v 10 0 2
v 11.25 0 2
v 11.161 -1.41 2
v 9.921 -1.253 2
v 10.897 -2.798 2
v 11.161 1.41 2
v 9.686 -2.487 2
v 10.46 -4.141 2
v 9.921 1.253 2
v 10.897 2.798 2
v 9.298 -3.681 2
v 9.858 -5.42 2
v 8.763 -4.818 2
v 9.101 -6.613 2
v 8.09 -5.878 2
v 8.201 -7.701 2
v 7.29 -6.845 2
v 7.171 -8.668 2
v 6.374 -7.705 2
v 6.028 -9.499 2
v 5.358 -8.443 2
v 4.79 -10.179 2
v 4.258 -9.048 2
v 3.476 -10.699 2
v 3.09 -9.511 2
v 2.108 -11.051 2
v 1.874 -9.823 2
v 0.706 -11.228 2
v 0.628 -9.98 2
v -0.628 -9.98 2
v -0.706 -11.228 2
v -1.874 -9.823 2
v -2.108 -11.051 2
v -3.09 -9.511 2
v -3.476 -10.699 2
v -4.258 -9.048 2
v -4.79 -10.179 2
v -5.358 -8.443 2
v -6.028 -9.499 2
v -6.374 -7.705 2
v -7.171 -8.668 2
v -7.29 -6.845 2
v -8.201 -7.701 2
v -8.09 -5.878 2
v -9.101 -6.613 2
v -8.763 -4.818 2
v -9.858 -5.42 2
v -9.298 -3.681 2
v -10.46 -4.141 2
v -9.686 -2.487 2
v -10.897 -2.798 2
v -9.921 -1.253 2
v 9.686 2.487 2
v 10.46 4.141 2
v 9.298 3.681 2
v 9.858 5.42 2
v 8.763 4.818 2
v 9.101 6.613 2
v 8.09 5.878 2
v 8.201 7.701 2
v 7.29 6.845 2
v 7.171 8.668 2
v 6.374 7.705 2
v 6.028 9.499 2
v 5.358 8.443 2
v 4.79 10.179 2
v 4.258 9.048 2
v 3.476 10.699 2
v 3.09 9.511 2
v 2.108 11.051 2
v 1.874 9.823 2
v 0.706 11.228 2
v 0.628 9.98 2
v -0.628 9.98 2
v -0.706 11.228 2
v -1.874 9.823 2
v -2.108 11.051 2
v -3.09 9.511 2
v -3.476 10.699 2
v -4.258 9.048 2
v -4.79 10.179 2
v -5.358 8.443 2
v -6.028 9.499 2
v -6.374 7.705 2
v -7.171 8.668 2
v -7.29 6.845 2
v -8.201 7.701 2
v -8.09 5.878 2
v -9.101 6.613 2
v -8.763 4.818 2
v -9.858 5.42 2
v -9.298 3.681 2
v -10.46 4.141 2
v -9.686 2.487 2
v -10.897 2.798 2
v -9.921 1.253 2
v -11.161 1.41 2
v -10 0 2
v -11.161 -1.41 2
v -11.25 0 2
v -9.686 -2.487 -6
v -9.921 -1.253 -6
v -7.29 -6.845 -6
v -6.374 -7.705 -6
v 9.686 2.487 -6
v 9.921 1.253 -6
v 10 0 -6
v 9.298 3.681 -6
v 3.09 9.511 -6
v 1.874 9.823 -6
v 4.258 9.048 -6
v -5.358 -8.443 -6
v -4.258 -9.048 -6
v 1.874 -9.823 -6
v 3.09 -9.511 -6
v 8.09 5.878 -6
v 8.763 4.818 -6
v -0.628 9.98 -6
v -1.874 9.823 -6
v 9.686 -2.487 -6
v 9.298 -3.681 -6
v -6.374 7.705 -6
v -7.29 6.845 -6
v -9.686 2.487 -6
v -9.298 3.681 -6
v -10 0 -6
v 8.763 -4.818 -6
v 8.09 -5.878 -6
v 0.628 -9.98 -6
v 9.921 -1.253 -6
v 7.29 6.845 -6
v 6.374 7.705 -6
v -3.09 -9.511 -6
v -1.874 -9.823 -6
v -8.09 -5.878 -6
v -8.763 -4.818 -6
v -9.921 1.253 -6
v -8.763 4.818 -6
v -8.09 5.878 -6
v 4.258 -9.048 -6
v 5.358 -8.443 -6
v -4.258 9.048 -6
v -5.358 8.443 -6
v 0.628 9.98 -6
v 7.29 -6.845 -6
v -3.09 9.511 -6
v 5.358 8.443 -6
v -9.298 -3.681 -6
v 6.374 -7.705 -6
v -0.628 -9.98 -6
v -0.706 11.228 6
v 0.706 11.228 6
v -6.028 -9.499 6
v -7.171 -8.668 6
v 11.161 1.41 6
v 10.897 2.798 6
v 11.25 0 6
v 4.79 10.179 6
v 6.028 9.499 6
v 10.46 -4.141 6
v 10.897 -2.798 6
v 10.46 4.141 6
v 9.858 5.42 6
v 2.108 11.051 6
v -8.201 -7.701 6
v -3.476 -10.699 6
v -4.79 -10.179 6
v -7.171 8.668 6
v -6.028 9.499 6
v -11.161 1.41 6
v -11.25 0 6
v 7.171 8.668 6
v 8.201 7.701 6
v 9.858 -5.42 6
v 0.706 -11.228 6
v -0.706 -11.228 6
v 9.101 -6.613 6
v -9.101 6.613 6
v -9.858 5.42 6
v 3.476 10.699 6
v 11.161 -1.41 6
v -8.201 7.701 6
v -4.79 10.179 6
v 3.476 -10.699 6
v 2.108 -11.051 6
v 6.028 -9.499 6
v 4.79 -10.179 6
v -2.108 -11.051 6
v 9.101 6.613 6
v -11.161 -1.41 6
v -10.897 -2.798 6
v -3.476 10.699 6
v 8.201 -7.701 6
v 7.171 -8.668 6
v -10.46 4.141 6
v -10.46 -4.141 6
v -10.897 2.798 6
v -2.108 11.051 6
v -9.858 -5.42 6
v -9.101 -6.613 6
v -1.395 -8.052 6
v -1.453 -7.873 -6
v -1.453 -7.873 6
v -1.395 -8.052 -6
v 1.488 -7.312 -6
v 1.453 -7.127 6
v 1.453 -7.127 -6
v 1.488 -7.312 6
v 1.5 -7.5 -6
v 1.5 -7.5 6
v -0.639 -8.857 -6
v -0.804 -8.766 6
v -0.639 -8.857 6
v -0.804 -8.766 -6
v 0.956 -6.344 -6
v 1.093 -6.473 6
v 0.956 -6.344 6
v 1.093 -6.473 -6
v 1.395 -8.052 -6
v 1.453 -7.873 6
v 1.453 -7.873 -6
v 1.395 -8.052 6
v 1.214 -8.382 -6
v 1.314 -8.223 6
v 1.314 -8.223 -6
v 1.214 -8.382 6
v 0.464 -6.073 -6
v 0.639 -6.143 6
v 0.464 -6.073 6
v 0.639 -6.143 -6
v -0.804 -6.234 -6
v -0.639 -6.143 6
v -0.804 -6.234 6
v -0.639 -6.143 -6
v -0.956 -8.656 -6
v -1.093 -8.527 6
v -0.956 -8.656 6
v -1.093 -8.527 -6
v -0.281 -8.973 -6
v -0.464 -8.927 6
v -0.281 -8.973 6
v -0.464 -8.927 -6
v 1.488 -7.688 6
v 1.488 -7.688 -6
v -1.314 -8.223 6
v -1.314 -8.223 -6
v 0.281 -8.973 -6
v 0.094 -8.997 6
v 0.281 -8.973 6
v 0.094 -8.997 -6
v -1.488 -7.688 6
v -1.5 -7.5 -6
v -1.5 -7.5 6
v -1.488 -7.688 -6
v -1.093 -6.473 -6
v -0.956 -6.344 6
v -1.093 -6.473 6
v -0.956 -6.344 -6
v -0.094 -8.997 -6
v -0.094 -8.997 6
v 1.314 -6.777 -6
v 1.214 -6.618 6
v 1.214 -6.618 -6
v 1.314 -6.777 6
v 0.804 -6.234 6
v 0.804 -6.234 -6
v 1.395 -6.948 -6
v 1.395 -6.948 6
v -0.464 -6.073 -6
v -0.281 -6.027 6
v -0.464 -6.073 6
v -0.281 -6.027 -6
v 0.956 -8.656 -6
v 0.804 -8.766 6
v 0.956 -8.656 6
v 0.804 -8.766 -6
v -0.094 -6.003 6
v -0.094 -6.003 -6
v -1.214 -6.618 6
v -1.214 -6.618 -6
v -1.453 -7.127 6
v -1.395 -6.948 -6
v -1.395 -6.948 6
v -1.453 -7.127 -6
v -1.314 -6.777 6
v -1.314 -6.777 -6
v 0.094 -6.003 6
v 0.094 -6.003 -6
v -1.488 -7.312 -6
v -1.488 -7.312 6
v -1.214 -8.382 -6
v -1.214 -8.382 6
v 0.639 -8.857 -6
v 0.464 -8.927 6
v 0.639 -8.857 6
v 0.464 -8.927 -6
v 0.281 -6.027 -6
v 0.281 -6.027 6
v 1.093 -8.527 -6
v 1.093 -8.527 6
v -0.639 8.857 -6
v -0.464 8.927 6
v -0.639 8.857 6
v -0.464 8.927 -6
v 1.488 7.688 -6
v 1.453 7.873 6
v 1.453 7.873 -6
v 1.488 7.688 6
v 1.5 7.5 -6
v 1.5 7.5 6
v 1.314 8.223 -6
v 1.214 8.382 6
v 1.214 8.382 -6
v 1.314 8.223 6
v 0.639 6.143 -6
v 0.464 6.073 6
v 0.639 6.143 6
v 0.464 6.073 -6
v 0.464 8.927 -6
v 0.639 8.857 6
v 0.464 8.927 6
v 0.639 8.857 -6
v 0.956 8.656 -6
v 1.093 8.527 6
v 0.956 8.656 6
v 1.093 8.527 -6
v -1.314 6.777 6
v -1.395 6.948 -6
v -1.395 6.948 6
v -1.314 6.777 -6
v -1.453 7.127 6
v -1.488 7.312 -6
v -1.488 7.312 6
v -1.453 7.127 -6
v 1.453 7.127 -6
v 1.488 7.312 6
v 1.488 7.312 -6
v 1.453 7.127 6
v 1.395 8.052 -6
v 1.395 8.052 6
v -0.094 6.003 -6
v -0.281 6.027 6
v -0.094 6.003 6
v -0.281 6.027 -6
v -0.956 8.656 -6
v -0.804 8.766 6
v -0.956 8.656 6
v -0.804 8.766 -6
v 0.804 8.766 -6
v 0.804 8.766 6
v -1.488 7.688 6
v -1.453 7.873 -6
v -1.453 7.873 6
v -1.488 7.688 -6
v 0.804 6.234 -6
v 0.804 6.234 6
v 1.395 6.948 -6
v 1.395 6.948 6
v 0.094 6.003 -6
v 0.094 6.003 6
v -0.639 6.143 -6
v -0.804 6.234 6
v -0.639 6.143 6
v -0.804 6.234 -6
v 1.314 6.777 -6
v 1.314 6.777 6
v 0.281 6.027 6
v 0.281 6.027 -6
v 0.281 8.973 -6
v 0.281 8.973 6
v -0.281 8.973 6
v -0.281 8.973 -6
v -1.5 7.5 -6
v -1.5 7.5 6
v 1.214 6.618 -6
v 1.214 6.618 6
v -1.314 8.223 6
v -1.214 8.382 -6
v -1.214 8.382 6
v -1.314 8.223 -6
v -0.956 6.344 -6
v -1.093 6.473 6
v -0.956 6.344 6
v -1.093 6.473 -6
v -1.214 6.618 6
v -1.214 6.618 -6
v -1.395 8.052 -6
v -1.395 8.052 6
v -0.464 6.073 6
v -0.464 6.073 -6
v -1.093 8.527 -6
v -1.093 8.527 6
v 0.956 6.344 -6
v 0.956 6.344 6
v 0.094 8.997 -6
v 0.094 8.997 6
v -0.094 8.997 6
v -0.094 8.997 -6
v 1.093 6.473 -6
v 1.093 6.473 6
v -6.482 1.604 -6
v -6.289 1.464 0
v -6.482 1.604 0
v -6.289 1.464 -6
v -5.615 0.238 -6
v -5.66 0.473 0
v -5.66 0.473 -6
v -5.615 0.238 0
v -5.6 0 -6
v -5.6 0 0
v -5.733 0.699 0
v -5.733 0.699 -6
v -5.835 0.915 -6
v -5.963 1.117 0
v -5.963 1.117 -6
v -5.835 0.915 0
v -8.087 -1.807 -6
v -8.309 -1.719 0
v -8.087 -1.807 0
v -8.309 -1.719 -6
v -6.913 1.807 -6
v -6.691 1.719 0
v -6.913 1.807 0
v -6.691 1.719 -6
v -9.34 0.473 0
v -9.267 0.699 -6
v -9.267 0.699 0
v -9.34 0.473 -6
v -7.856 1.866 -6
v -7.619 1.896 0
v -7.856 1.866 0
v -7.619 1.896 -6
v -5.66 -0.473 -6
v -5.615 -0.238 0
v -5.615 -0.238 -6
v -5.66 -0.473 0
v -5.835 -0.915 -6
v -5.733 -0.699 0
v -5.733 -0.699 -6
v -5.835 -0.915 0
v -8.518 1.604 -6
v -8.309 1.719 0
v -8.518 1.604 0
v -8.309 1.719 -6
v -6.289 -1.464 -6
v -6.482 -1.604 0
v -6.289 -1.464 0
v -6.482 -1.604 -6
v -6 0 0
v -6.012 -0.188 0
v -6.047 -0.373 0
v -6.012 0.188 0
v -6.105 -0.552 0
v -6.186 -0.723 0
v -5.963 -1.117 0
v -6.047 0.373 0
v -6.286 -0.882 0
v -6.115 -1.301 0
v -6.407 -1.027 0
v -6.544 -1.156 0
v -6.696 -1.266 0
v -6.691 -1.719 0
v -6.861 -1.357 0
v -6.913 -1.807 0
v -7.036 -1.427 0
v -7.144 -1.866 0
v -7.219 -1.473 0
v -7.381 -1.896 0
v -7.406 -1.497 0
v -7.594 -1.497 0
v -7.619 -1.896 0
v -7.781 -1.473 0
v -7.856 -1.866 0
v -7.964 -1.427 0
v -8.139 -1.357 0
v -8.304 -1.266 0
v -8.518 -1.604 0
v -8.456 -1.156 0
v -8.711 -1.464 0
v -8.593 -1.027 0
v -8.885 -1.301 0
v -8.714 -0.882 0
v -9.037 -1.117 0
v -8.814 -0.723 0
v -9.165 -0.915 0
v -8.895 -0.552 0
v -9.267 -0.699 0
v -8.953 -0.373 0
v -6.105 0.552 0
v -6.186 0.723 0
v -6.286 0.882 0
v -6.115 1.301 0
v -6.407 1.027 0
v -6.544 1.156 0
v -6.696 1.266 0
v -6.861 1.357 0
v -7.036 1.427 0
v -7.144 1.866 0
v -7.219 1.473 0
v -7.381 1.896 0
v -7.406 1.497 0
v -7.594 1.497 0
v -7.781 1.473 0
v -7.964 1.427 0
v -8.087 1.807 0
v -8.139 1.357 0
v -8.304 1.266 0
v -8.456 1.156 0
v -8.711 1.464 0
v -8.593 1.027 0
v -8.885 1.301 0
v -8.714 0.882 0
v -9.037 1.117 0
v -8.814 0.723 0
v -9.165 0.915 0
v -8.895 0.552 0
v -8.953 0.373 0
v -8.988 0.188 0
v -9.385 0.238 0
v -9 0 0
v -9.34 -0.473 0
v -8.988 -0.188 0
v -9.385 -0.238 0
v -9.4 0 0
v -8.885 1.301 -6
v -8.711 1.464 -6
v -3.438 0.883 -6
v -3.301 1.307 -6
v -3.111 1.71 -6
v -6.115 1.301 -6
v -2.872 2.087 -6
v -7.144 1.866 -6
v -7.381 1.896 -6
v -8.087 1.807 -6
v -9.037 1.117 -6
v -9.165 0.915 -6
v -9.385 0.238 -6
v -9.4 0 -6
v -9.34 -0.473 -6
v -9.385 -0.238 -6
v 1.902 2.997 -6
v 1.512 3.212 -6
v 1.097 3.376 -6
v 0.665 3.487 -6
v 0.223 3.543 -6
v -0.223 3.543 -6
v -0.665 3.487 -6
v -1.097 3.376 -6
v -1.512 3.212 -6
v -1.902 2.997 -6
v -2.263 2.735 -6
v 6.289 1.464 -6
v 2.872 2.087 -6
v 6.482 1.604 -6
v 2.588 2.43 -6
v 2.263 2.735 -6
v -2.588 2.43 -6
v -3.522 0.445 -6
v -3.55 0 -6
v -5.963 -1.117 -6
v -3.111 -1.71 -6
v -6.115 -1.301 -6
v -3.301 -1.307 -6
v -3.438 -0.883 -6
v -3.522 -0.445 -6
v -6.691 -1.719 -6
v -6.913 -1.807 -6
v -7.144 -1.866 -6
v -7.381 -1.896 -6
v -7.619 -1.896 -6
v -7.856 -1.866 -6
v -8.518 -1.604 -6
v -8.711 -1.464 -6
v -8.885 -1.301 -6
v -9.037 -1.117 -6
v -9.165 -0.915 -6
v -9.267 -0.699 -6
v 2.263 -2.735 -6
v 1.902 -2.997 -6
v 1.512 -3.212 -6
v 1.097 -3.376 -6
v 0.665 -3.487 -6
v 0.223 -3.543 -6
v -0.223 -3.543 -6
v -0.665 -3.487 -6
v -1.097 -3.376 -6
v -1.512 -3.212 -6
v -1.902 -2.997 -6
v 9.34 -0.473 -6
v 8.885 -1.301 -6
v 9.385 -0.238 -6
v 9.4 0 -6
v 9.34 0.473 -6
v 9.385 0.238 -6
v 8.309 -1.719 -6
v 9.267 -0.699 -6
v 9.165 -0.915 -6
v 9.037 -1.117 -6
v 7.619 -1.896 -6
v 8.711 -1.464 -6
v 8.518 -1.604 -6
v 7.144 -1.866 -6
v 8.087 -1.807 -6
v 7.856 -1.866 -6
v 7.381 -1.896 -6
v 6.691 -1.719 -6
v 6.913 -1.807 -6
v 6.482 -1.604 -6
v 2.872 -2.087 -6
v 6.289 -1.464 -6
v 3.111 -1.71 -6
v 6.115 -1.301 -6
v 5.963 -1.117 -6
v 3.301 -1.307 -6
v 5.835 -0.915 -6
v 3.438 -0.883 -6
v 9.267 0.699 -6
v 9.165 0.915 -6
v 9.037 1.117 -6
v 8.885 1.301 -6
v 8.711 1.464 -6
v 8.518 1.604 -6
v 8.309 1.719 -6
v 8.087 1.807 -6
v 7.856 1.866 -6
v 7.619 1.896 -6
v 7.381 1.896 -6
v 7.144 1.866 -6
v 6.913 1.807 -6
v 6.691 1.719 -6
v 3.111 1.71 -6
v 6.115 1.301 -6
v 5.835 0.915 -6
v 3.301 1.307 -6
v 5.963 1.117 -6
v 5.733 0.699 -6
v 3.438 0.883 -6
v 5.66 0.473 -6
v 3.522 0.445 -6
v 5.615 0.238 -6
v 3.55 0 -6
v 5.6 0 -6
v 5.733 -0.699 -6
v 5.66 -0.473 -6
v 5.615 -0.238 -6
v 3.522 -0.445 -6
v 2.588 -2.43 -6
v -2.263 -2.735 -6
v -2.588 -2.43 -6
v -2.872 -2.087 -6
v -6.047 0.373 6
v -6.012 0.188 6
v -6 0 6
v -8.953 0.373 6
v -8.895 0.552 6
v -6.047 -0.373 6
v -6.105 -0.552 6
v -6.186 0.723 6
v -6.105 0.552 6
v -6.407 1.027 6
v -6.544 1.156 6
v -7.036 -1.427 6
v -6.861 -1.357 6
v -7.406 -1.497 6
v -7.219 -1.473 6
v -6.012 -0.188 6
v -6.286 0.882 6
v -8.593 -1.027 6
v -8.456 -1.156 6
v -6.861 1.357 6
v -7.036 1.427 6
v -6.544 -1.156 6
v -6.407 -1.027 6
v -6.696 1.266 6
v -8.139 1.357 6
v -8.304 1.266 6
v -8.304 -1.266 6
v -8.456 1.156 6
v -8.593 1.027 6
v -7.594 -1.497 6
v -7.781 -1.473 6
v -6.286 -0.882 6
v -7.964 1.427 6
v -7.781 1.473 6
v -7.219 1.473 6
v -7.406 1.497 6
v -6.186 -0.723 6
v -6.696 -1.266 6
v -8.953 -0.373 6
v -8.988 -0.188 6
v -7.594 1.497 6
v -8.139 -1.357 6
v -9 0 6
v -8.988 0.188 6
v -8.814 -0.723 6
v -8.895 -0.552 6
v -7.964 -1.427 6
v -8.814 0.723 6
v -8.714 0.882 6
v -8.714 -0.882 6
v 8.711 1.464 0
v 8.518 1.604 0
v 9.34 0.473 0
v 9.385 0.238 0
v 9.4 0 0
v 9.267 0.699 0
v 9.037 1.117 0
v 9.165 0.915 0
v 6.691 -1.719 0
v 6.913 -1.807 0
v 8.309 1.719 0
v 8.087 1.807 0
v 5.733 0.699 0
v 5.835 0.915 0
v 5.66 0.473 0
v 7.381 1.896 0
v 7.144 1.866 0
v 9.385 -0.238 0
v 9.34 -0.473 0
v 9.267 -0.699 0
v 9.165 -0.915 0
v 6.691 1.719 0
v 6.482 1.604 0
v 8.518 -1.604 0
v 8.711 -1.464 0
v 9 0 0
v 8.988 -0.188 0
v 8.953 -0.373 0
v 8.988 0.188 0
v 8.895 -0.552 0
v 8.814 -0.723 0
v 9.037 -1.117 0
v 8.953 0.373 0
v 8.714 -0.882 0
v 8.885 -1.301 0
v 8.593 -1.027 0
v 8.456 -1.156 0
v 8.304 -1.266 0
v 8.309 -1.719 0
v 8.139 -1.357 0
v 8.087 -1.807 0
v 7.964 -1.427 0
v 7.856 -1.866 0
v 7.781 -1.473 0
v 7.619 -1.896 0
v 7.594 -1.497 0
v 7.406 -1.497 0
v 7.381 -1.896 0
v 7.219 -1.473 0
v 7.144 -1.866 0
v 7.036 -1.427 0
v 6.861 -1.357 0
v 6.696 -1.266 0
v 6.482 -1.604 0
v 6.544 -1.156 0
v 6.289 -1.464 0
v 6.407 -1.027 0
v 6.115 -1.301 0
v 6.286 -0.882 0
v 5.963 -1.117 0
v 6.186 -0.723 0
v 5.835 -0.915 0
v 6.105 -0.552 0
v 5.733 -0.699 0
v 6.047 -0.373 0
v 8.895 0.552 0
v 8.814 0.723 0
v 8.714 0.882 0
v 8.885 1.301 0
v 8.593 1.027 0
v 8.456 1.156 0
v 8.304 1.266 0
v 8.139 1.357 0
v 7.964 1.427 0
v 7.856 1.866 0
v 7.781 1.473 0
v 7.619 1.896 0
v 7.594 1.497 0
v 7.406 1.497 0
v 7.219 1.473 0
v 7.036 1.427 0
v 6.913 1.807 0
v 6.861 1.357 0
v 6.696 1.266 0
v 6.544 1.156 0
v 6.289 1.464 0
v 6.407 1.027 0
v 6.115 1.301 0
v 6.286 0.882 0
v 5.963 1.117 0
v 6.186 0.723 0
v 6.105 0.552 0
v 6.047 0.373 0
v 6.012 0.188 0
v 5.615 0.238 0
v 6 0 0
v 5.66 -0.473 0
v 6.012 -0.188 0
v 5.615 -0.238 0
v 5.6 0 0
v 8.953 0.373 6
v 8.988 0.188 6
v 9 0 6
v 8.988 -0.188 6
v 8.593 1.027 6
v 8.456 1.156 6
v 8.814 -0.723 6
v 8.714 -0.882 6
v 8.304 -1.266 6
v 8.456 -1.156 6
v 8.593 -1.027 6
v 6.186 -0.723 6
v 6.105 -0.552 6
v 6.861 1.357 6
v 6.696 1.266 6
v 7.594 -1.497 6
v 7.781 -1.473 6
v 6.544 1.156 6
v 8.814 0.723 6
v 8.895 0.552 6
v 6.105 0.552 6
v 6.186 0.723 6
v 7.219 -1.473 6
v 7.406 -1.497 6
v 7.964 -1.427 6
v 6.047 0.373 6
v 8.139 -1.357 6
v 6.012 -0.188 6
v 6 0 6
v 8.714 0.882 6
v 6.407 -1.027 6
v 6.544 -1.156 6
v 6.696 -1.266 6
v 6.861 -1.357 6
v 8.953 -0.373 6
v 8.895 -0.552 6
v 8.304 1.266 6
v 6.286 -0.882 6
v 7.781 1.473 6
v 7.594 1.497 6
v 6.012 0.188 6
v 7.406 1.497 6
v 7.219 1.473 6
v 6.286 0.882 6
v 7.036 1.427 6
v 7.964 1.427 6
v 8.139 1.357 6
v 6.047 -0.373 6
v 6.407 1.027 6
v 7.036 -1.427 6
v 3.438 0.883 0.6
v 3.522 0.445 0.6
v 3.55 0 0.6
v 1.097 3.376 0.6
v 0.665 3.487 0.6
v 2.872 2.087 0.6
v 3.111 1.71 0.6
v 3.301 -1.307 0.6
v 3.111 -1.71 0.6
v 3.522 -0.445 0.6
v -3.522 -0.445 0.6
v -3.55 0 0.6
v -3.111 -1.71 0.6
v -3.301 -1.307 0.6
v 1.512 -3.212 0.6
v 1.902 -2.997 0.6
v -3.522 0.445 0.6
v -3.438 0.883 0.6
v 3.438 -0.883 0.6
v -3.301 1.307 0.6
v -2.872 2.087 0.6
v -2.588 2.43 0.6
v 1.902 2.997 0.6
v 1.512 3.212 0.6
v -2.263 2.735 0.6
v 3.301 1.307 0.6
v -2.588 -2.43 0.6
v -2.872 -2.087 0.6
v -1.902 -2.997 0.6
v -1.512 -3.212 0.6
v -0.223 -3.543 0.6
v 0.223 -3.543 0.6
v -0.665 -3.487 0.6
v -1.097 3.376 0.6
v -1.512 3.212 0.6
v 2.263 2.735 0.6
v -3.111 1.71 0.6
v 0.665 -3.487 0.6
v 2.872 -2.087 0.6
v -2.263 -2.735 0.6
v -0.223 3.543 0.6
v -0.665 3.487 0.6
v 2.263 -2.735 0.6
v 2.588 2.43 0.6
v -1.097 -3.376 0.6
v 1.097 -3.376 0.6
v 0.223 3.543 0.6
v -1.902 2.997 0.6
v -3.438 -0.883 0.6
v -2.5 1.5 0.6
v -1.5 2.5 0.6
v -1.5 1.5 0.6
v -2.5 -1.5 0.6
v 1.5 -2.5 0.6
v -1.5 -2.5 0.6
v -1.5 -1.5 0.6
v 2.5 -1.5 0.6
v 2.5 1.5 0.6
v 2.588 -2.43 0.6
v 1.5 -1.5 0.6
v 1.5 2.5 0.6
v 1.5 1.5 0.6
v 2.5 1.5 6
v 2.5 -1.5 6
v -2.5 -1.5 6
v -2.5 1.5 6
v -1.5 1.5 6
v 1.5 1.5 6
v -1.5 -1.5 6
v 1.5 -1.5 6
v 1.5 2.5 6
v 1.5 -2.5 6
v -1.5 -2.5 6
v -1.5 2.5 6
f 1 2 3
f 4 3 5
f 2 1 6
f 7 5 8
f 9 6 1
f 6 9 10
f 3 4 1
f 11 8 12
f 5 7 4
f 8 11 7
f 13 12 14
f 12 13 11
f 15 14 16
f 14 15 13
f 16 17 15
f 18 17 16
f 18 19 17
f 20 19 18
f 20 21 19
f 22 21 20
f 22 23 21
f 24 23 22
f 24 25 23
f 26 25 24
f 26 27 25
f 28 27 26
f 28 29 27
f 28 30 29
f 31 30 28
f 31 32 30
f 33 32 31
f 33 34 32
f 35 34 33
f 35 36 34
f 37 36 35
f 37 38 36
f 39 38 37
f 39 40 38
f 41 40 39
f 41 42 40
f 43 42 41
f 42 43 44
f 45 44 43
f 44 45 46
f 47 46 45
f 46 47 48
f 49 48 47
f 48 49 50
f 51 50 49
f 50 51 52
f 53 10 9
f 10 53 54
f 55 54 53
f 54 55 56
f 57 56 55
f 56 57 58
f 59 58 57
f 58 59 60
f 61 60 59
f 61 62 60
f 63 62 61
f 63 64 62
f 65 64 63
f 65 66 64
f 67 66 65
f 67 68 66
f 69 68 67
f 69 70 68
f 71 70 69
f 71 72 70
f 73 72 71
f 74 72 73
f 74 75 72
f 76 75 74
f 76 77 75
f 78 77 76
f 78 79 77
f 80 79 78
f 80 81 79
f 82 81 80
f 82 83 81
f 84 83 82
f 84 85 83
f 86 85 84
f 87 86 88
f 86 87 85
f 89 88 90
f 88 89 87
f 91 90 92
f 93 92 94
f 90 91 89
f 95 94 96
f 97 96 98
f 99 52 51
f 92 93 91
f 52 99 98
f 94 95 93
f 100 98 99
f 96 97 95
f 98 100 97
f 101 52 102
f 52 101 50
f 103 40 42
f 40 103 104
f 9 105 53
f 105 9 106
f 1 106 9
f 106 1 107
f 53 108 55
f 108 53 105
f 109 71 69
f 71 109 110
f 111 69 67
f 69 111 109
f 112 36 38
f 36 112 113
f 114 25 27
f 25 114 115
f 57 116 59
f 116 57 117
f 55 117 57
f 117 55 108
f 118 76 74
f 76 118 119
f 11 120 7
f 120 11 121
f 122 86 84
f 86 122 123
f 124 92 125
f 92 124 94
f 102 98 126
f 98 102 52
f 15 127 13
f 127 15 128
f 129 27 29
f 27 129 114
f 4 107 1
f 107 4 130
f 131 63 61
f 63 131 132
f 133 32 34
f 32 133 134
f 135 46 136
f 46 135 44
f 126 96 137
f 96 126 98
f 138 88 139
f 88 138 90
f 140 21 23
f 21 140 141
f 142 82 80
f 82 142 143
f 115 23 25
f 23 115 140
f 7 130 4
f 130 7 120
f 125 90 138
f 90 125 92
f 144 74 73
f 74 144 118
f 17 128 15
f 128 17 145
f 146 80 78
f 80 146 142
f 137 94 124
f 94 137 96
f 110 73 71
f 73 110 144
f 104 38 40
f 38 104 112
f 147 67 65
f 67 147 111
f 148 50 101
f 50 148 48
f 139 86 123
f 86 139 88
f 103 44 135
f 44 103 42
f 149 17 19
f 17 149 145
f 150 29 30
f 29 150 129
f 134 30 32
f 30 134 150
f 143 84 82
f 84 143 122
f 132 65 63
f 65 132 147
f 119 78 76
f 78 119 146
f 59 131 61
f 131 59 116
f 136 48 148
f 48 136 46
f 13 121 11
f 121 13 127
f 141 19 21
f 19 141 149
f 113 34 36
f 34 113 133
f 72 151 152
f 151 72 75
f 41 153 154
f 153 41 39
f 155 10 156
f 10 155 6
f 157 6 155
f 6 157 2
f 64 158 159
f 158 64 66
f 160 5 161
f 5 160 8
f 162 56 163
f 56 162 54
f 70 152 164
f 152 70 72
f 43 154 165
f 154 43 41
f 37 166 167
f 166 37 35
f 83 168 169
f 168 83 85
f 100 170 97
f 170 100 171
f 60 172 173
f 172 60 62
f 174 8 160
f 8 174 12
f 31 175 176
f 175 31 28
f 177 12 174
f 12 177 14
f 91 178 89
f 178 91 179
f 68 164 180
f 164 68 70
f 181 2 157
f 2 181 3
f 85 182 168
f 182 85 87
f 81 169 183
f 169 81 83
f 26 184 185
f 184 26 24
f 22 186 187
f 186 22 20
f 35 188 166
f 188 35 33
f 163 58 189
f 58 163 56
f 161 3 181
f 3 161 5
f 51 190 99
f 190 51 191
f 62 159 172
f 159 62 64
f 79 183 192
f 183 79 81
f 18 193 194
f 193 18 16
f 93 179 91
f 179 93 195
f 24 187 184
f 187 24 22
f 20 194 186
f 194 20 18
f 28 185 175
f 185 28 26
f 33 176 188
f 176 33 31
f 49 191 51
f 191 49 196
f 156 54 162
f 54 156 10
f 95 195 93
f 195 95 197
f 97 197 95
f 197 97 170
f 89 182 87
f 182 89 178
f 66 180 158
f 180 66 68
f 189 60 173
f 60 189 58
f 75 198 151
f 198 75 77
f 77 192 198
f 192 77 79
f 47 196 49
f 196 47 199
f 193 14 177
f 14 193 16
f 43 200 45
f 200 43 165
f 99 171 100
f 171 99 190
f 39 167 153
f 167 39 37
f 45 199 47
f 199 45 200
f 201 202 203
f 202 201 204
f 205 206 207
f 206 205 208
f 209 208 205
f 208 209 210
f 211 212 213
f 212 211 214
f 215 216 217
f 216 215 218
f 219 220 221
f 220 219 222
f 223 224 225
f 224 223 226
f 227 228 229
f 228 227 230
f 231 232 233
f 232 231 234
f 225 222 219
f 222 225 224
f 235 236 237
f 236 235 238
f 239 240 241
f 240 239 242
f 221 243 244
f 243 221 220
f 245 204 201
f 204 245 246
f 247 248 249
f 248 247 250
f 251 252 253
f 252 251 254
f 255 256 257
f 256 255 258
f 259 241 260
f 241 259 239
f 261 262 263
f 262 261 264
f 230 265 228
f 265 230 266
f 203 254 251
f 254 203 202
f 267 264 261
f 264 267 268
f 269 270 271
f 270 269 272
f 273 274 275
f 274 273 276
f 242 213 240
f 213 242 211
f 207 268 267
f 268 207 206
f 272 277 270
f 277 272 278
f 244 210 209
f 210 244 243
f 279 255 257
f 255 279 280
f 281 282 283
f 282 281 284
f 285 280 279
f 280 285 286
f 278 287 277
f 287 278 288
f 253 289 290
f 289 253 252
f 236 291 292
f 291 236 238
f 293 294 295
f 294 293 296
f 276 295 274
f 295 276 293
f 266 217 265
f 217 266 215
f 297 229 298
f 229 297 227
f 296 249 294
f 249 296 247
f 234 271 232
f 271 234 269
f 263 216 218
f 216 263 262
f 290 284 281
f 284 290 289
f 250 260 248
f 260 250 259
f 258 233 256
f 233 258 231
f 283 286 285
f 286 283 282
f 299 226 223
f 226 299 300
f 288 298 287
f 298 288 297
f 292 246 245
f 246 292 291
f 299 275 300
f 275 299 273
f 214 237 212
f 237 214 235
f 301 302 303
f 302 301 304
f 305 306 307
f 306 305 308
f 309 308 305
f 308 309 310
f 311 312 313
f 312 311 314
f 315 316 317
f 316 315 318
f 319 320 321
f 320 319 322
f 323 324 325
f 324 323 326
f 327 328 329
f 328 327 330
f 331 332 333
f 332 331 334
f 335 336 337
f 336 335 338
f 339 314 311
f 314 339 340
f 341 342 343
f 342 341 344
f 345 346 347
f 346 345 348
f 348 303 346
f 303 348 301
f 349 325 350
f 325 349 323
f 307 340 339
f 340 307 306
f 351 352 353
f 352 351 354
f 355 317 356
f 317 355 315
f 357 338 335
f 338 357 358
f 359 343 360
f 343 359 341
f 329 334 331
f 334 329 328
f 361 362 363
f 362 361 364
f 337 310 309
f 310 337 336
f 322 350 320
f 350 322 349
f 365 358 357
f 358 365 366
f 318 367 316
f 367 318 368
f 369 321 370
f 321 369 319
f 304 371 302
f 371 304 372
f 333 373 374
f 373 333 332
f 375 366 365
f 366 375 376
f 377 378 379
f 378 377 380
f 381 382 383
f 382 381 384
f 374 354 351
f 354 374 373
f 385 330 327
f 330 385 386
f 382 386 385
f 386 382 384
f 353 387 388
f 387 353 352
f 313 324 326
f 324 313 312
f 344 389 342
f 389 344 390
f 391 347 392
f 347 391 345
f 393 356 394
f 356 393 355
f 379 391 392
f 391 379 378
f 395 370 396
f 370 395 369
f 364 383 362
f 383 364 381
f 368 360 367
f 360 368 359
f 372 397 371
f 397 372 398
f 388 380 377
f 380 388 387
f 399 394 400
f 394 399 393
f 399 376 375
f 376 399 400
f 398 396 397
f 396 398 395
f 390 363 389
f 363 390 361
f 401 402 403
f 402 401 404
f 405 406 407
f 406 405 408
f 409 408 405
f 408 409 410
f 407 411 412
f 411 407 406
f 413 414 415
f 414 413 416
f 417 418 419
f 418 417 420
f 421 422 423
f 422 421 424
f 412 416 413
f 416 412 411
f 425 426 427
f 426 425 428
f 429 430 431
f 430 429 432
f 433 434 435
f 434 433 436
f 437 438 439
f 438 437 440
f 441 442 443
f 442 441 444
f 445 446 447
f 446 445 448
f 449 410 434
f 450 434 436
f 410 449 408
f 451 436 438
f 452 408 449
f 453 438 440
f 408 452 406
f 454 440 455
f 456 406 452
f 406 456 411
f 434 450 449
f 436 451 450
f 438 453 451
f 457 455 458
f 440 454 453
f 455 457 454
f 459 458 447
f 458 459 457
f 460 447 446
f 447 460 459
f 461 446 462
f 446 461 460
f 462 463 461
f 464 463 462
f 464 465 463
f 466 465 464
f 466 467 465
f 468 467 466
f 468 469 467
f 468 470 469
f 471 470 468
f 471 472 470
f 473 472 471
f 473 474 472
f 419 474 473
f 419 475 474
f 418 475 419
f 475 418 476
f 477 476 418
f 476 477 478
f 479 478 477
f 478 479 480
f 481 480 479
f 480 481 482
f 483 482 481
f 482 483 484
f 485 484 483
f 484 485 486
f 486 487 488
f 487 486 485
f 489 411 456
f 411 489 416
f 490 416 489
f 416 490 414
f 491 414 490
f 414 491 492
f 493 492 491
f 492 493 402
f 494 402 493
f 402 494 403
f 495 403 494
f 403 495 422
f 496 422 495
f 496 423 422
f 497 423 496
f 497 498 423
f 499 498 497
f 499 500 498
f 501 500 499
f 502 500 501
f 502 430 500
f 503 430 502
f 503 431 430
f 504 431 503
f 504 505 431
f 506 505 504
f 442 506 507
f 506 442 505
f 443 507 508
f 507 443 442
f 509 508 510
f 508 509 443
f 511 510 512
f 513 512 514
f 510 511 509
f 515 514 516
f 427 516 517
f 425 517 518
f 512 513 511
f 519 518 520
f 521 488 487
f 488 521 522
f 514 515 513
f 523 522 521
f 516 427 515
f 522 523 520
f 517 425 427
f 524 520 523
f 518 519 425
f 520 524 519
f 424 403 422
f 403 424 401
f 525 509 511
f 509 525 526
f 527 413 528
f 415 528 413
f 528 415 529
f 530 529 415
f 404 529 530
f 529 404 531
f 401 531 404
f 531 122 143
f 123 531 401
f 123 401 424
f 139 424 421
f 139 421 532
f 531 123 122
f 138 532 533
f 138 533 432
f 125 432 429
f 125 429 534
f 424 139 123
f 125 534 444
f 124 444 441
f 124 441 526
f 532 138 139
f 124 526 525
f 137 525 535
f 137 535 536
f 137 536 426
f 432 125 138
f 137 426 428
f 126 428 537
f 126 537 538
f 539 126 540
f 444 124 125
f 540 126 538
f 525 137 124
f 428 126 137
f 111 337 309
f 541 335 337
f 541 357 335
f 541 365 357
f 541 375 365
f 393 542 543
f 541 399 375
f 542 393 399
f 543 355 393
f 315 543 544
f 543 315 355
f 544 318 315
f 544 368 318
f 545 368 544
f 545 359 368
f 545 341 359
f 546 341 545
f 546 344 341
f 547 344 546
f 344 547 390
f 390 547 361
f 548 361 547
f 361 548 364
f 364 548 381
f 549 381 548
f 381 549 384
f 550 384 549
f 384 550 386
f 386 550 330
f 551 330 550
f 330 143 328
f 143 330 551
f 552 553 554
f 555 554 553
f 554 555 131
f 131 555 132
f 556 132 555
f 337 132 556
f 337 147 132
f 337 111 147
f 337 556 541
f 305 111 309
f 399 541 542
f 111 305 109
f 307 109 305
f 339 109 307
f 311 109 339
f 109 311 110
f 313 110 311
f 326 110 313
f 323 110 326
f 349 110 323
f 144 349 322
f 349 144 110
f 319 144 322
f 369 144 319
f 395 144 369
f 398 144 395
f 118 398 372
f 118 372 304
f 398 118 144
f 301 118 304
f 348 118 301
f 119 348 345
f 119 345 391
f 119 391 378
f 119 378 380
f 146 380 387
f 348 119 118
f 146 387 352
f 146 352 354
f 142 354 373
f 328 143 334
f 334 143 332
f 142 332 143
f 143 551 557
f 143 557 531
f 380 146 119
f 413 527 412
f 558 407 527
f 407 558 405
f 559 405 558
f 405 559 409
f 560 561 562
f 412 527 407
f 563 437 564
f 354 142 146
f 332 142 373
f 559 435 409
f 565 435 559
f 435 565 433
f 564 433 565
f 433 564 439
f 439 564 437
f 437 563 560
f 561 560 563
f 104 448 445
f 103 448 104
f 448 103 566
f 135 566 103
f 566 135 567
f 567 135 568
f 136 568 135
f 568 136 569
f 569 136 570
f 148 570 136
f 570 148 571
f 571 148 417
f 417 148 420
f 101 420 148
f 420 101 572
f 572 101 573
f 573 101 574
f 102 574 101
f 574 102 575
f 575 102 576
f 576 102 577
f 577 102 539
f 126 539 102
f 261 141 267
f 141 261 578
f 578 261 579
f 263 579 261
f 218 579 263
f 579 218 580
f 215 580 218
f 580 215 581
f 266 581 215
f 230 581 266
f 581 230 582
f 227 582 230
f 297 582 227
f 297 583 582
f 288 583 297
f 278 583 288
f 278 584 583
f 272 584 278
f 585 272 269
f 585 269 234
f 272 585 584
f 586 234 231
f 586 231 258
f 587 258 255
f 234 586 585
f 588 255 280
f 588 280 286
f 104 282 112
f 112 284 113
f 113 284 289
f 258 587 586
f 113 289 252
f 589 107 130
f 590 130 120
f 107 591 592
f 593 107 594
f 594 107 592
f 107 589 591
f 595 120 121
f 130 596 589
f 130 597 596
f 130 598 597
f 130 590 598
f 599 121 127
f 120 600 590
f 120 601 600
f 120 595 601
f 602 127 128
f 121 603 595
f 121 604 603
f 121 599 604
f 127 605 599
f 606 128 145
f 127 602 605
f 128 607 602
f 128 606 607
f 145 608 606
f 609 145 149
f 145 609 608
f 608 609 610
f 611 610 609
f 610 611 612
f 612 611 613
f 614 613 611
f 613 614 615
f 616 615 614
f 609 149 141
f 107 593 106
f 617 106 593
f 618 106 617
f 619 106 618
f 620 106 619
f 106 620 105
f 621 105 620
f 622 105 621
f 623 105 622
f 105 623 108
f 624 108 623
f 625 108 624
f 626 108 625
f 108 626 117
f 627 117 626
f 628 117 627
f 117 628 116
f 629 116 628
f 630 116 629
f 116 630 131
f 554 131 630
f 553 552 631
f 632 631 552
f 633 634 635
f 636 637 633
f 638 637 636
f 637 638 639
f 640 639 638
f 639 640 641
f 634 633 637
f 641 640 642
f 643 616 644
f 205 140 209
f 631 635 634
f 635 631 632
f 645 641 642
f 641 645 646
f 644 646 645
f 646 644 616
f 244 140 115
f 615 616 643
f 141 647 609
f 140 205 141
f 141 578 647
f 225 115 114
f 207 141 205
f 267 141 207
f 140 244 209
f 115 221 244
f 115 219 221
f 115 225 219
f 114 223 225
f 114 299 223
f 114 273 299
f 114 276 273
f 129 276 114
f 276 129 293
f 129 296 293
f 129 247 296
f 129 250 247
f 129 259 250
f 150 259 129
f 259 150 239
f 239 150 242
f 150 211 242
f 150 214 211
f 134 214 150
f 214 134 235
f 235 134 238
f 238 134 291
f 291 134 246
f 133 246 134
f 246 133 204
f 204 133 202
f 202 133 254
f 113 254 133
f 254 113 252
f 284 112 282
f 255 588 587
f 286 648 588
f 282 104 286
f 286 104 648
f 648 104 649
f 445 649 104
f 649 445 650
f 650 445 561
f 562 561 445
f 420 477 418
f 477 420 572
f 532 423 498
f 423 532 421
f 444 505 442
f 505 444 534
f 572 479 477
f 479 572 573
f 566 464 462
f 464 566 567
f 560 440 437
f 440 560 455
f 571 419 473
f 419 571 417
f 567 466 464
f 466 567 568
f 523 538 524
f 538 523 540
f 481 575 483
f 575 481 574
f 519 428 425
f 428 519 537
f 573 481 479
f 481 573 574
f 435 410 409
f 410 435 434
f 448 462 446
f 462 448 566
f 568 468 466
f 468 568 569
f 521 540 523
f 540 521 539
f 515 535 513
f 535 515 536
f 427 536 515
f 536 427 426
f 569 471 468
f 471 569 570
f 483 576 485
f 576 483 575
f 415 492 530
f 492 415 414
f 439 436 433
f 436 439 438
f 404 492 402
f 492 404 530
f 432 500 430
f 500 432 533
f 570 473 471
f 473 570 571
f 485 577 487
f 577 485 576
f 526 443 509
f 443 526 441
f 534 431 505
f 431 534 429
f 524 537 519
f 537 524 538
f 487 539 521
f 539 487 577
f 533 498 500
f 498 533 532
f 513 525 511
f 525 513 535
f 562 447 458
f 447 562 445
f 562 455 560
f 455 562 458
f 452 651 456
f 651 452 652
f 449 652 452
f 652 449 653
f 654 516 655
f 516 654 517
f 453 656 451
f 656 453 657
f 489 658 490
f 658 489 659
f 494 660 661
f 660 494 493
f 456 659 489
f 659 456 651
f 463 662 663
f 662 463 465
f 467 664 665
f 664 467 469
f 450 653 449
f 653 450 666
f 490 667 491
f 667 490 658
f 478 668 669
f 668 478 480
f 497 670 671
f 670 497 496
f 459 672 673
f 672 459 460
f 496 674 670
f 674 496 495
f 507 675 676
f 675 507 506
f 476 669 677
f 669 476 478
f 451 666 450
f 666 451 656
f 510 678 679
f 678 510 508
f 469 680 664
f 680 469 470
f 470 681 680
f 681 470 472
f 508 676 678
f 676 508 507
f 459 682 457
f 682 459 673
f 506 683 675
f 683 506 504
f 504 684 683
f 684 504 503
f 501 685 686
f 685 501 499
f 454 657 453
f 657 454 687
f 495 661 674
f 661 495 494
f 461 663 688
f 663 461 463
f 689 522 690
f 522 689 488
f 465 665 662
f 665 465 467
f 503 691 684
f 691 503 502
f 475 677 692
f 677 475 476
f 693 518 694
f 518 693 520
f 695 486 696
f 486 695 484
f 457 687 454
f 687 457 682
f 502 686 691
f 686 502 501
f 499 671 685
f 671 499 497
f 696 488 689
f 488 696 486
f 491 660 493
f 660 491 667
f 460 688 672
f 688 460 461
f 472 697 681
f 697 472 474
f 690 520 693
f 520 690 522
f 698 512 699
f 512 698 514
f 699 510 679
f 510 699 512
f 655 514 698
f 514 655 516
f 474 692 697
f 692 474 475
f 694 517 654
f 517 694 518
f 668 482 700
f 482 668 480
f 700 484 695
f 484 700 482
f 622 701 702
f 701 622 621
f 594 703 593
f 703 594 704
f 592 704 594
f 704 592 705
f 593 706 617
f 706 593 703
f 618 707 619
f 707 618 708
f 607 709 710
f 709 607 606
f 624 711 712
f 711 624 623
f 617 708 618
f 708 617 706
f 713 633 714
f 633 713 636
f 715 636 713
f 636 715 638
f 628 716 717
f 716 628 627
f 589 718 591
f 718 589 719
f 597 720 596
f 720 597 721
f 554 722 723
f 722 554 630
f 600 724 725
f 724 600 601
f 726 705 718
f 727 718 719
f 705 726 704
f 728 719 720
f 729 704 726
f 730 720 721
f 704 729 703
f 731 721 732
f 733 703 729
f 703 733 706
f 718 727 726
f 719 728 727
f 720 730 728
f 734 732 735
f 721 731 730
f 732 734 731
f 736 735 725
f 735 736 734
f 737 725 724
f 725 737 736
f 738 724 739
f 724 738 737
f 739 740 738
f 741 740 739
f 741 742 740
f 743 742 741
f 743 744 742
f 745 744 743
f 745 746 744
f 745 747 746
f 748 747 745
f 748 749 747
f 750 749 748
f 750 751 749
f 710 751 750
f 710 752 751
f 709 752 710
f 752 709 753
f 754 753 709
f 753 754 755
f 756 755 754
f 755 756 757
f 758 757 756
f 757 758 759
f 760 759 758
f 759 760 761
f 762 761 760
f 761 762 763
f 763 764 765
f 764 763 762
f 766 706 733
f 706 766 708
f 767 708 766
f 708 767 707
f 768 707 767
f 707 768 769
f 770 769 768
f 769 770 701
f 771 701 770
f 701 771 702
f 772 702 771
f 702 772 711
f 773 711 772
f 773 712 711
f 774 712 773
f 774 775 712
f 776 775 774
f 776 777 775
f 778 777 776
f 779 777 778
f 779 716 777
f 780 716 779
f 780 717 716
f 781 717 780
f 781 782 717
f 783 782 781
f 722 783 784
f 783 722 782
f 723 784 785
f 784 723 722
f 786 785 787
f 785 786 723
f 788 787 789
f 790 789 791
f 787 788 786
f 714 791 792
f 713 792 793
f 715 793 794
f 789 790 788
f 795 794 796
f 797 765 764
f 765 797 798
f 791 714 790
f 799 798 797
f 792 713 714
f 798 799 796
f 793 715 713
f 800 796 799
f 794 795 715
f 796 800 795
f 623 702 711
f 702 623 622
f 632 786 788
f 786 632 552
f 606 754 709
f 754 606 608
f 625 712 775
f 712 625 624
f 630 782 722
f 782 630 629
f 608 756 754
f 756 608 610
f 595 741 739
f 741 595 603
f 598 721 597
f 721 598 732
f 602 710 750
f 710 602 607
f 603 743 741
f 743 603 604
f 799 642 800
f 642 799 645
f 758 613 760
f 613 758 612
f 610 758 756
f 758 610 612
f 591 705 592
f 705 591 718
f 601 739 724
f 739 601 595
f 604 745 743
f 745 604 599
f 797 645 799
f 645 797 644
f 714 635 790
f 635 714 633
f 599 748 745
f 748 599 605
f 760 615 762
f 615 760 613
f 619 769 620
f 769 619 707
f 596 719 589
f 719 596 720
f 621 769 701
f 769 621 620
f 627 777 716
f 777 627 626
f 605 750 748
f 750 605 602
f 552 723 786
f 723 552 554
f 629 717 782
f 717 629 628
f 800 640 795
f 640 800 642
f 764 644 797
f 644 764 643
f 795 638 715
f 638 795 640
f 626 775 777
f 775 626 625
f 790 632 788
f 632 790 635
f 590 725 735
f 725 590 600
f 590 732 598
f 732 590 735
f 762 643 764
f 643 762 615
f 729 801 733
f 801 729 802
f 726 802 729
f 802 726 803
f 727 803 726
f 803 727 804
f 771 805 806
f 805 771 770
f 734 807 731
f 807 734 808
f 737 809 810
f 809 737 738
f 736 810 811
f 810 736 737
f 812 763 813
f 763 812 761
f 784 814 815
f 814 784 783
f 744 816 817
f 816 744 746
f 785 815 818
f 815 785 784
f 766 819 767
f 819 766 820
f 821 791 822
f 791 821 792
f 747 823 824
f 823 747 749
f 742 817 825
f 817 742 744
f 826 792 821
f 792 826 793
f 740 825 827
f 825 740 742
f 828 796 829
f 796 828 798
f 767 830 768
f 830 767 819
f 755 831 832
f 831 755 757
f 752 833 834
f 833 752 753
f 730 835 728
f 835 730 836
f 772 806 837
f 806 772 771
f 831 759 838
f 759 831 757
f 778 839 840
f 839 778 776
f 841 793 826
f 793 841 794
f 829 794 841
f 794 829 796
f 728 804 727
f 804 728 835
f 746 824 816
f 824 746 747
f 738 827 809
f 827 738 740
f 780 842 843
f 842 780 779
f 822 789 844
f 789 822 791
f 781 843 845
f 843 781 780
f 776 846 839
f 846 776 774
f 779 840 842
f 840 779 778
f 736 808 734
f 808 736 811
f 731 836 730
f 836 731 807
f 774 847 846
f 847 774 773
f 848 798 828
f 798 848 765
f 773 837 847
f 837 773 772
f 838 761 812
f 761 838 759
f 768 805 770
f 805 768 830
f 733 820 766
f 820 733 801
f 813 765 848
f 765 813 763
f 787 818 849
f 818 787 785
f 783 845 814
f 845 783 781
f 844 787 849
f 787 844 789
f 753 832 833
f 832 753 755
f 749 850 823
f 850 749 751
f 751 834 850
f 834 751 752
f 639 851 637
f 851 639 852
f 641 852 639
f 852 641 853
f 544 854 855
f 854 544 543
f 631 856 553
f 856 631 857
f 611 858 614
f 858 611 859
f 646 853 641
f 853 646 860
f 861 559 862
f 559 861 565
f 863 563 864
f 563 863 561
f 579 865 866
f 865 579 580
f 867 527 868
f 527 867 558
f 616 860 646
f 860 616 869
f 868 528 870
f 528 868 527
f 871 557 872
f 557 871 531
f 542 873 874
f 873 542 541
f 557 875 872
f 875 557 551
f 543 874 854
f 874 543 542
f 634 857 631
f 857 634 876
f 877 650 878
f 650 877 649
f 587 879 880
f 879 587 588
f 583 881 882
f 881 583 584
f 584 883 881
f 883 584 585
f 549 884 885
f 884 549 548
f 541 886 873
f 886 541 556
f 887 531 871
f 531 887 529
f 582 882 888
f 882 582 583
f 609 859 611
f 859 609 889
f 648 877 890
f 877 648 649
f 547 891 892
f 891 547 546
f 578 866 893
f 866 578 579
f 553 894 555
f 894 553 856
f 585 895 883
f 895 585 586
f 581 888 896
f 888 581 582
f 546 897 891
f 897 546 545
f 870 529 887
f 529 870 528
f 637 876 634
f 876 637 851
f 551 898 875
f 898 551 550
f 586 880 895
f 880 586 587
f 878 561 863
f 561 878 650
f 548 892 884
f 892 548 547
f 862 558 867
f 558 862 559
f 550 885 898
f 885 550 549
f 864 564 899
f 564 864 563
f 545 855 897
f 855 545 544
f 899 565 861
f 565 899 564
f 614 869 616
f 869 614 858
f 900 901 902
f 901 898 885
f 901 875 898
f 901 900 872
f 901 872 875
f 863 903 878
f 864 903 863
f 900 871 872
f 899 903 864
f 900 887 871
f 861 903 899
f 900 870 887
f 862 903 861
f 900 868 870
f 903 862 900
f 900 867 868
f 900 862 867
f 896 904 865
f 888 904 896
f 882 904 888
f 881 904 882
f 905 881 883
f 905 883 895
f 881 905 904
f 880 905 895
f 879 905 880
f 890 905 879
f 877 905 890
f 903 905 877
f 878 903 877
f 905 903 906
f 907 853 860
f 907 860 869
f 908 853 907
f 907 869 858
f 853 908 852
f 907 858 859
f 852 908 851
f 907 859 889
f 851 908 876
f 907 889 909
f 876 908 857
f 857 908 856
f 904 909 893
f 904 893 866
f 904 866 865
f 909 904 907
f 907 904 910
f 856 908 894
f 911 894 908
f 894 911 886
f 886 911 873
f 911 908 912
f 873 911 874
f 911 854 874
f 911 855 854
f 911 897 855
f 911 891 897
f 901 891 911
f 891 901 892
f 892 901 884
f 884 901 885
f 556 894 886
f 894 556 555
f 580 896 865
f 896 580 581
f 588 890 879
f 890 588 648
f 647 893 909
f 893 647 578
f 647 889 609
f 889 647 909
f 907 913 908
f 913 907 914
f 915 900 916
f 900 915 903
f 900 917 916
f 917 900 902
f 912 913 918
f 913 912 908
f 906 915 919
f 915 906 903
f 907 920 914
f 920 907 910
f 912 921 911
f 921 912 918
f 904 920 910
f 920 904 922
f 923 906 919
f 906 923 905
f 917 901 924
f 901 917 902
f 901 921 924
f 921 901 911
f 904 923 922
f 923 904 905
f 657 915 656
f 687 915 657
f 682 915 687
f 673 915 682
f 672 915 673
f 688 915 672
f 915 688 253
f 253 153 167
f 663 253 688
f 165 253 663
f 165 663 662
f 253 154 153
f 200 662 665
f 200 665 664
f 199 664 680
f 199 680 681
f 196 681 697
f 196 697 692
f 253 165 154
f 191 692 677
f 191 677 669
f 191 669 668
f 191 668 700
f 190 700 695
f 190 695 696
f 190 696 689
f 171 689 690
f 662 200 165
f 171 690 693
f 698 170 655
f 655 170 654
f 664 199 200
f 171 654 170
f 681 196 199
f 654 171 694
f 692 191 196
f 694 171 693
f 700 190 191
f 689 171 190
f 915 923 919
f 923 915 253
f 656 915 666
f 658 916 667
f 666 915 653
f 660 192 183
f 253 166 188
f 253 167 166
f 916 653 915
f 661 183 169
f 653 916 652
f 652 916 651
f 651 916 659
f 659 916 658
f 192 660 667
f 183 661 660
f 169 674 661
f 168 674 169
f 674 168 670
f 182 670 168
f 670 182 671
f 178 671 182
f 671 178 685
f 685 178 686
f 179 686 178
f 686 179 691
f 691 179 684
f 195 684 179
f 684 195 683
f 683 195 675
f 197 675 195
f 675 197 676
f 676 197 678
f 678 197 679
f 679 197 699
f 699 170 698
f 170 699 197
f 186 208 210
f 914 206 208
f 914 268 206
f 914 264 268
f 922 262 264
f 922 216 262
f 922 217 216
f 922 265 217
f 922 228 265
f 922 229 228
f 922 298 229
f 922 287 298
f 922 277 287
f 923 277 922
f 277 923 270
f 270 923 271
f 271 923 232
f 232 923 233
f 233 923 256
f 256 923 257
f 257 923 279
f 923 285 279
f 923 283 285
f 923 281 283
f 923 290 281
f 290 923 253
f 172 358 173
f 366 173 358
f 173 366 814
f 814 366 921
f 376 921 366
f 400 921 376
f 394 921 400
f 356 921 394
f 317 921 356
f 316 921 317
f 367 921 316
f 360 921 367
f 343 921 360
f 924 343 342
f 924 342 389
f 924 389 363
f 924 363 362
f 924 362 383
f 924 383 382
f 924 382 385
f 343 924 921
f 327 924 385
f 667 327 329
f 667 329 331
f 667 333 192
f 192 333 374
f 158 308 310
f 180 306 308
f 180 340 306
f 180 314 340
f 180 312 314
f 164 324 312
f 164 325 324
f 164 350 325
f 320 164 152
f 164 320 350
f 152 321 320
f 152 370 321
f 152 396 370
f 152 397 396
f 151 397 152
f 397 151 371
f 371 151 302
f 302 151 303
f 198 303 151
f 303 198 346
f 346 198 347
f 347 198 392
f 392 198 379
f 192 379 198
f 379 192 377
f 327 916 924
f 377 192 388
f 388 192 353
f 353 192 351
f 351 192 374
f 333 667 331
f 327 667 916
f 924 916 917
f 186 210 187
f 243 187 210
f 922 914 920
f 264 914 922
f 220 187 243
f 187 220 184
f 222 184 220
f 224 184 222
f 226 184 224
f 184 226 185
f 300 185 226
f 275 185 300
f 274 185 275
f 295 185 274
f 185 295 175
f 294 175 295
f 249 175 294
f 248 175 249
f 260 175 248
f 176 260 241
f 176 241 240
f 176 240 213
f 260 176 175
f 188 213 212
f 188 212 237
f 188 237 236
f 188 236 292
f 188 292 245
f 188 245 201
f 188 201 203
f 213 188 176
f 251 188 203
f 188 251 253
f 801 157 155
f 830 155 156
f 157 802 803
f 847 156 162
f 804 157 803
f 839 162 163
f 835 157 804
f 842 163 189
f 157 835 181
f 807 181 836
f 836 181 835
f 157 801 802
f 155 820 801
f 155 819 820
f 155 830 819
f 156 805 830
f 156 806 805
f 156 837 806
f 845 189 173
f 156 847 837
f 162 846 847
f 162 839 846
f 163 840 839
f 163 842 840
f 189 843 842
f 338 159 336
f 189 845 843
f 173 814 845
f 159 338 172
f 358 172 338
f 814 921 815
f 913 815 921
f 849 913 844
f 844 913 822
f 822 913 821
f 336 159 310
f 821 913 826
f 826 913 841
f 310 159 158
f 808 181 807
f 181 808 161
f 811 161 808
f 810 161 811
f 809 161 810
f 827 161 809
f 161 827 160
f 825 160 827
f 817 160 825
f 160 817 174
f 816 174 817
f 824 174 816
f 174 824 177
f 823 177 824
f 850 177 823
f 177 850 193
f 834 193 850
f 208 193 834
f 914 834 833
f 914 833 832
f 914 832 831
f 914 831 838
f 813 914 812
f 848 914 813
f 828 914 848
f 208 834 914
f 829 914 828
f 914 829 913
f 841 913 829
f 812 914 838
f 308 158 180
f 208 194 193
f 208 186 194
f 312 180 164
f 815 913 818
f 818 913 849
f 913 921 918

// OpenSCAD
$fn = 50;

difference() {
	union() {
		translate(v = [0, 0, 0]) {
			rotate(a = [0, 0, 0]) {
				difference() {
					union() {
						translate(v = [0, 0, -6.0]) {
							cylinder(h = 12, r = 12);
						}
					}
					union() {
						translate(v = [0, 0, 0]) {
							rotate(a = [0, 0, 0]) {
								difference() {
									union() {
										translate(v = [0, 0, -2.0]) {
											cylinder(h = 4, r = 13.5);
										}
									}
									union() {
										translate(v = [0, 0, -2.01]) {
											cylinder(h = 4.02, r = 10.0);
										}
									}
								}
							}
						}
						translate(v = [0, 0, -3]) {
							rotate(a = [0, 0, 0]) {
								difference() {
									union() {
										translate(v = [0, 0, -2.0]) {
											cylinder(h = 4, r = 13.5);
										}
									}
									union() {
										translate(v = [0, 0, -2.01]) {
											cylinder(h = 4.02, r = 10.0);
										}
									}
								}
							}
						}
						translate(v = [0, 0, -6]) {
							rotate(a = [0, 0, 0]) {
								difference() {
									union() {
										translate(v = [0, 0, -2.0]) {
											cylinder(h = 4, r = 13.5);
										}
									}
									union() {
										translate(v = [0, 0, -2.01]) {
											cylinder(h = 4.02, r = 10.0);
										}
									}
								}
							}
						}
						translate(v = [0, 0, 0]) {
							rotate(a = [0, 0, 0]) {
								difference() {
									union() {
										translate(v = [0, 0, -21.0]) {
											cylinder(h = 42, r = 12.25);
										}
									}
									union() {
										translate(v = [0, 0, -21.01]) {
											cylinder(h = 42.02, r = 11.25);
										}
									}
								}
							}
						}
						translate(v = [0.0, -7.5, -7.0]) {
							cylinder(h = 14, r = 1.5);
						}
						translate(v = [0.0, 7.5, -7.0]) {
							cylinder(h = 14, r = 1.5);
						}
						translate(v = [-7.5, 0, -6.0]) {
							cylinder(h = 6, r = 1.9);
						}
						translate(v = [-7.5, 0, -7.0]) {
							cylinder(h = 14, r = 1.5);
						}
						translate(v = [7.5, 0, -6.0]) {
							cylinder(h = 6, r = 1.9);
						}
						translate(v = [7.5, 0, -7.0]) {
							cylinder(h = 14, r = 1.5);
						}
						translate(v = [0, 0, -6.000000000000001]) {
							cylinder(h = 6.6, r = 3.55);
						}
						translate(v = [-2.5, -1.5, -7.0]) {
							cube(size = [5, 3, 14]);
						}
						translate(v = [-1.5, -2.5, -7.0]) {
							cube(size = [3, 5, 14]);
						}
					}
				}
			}
		}
	}
	union();
}
